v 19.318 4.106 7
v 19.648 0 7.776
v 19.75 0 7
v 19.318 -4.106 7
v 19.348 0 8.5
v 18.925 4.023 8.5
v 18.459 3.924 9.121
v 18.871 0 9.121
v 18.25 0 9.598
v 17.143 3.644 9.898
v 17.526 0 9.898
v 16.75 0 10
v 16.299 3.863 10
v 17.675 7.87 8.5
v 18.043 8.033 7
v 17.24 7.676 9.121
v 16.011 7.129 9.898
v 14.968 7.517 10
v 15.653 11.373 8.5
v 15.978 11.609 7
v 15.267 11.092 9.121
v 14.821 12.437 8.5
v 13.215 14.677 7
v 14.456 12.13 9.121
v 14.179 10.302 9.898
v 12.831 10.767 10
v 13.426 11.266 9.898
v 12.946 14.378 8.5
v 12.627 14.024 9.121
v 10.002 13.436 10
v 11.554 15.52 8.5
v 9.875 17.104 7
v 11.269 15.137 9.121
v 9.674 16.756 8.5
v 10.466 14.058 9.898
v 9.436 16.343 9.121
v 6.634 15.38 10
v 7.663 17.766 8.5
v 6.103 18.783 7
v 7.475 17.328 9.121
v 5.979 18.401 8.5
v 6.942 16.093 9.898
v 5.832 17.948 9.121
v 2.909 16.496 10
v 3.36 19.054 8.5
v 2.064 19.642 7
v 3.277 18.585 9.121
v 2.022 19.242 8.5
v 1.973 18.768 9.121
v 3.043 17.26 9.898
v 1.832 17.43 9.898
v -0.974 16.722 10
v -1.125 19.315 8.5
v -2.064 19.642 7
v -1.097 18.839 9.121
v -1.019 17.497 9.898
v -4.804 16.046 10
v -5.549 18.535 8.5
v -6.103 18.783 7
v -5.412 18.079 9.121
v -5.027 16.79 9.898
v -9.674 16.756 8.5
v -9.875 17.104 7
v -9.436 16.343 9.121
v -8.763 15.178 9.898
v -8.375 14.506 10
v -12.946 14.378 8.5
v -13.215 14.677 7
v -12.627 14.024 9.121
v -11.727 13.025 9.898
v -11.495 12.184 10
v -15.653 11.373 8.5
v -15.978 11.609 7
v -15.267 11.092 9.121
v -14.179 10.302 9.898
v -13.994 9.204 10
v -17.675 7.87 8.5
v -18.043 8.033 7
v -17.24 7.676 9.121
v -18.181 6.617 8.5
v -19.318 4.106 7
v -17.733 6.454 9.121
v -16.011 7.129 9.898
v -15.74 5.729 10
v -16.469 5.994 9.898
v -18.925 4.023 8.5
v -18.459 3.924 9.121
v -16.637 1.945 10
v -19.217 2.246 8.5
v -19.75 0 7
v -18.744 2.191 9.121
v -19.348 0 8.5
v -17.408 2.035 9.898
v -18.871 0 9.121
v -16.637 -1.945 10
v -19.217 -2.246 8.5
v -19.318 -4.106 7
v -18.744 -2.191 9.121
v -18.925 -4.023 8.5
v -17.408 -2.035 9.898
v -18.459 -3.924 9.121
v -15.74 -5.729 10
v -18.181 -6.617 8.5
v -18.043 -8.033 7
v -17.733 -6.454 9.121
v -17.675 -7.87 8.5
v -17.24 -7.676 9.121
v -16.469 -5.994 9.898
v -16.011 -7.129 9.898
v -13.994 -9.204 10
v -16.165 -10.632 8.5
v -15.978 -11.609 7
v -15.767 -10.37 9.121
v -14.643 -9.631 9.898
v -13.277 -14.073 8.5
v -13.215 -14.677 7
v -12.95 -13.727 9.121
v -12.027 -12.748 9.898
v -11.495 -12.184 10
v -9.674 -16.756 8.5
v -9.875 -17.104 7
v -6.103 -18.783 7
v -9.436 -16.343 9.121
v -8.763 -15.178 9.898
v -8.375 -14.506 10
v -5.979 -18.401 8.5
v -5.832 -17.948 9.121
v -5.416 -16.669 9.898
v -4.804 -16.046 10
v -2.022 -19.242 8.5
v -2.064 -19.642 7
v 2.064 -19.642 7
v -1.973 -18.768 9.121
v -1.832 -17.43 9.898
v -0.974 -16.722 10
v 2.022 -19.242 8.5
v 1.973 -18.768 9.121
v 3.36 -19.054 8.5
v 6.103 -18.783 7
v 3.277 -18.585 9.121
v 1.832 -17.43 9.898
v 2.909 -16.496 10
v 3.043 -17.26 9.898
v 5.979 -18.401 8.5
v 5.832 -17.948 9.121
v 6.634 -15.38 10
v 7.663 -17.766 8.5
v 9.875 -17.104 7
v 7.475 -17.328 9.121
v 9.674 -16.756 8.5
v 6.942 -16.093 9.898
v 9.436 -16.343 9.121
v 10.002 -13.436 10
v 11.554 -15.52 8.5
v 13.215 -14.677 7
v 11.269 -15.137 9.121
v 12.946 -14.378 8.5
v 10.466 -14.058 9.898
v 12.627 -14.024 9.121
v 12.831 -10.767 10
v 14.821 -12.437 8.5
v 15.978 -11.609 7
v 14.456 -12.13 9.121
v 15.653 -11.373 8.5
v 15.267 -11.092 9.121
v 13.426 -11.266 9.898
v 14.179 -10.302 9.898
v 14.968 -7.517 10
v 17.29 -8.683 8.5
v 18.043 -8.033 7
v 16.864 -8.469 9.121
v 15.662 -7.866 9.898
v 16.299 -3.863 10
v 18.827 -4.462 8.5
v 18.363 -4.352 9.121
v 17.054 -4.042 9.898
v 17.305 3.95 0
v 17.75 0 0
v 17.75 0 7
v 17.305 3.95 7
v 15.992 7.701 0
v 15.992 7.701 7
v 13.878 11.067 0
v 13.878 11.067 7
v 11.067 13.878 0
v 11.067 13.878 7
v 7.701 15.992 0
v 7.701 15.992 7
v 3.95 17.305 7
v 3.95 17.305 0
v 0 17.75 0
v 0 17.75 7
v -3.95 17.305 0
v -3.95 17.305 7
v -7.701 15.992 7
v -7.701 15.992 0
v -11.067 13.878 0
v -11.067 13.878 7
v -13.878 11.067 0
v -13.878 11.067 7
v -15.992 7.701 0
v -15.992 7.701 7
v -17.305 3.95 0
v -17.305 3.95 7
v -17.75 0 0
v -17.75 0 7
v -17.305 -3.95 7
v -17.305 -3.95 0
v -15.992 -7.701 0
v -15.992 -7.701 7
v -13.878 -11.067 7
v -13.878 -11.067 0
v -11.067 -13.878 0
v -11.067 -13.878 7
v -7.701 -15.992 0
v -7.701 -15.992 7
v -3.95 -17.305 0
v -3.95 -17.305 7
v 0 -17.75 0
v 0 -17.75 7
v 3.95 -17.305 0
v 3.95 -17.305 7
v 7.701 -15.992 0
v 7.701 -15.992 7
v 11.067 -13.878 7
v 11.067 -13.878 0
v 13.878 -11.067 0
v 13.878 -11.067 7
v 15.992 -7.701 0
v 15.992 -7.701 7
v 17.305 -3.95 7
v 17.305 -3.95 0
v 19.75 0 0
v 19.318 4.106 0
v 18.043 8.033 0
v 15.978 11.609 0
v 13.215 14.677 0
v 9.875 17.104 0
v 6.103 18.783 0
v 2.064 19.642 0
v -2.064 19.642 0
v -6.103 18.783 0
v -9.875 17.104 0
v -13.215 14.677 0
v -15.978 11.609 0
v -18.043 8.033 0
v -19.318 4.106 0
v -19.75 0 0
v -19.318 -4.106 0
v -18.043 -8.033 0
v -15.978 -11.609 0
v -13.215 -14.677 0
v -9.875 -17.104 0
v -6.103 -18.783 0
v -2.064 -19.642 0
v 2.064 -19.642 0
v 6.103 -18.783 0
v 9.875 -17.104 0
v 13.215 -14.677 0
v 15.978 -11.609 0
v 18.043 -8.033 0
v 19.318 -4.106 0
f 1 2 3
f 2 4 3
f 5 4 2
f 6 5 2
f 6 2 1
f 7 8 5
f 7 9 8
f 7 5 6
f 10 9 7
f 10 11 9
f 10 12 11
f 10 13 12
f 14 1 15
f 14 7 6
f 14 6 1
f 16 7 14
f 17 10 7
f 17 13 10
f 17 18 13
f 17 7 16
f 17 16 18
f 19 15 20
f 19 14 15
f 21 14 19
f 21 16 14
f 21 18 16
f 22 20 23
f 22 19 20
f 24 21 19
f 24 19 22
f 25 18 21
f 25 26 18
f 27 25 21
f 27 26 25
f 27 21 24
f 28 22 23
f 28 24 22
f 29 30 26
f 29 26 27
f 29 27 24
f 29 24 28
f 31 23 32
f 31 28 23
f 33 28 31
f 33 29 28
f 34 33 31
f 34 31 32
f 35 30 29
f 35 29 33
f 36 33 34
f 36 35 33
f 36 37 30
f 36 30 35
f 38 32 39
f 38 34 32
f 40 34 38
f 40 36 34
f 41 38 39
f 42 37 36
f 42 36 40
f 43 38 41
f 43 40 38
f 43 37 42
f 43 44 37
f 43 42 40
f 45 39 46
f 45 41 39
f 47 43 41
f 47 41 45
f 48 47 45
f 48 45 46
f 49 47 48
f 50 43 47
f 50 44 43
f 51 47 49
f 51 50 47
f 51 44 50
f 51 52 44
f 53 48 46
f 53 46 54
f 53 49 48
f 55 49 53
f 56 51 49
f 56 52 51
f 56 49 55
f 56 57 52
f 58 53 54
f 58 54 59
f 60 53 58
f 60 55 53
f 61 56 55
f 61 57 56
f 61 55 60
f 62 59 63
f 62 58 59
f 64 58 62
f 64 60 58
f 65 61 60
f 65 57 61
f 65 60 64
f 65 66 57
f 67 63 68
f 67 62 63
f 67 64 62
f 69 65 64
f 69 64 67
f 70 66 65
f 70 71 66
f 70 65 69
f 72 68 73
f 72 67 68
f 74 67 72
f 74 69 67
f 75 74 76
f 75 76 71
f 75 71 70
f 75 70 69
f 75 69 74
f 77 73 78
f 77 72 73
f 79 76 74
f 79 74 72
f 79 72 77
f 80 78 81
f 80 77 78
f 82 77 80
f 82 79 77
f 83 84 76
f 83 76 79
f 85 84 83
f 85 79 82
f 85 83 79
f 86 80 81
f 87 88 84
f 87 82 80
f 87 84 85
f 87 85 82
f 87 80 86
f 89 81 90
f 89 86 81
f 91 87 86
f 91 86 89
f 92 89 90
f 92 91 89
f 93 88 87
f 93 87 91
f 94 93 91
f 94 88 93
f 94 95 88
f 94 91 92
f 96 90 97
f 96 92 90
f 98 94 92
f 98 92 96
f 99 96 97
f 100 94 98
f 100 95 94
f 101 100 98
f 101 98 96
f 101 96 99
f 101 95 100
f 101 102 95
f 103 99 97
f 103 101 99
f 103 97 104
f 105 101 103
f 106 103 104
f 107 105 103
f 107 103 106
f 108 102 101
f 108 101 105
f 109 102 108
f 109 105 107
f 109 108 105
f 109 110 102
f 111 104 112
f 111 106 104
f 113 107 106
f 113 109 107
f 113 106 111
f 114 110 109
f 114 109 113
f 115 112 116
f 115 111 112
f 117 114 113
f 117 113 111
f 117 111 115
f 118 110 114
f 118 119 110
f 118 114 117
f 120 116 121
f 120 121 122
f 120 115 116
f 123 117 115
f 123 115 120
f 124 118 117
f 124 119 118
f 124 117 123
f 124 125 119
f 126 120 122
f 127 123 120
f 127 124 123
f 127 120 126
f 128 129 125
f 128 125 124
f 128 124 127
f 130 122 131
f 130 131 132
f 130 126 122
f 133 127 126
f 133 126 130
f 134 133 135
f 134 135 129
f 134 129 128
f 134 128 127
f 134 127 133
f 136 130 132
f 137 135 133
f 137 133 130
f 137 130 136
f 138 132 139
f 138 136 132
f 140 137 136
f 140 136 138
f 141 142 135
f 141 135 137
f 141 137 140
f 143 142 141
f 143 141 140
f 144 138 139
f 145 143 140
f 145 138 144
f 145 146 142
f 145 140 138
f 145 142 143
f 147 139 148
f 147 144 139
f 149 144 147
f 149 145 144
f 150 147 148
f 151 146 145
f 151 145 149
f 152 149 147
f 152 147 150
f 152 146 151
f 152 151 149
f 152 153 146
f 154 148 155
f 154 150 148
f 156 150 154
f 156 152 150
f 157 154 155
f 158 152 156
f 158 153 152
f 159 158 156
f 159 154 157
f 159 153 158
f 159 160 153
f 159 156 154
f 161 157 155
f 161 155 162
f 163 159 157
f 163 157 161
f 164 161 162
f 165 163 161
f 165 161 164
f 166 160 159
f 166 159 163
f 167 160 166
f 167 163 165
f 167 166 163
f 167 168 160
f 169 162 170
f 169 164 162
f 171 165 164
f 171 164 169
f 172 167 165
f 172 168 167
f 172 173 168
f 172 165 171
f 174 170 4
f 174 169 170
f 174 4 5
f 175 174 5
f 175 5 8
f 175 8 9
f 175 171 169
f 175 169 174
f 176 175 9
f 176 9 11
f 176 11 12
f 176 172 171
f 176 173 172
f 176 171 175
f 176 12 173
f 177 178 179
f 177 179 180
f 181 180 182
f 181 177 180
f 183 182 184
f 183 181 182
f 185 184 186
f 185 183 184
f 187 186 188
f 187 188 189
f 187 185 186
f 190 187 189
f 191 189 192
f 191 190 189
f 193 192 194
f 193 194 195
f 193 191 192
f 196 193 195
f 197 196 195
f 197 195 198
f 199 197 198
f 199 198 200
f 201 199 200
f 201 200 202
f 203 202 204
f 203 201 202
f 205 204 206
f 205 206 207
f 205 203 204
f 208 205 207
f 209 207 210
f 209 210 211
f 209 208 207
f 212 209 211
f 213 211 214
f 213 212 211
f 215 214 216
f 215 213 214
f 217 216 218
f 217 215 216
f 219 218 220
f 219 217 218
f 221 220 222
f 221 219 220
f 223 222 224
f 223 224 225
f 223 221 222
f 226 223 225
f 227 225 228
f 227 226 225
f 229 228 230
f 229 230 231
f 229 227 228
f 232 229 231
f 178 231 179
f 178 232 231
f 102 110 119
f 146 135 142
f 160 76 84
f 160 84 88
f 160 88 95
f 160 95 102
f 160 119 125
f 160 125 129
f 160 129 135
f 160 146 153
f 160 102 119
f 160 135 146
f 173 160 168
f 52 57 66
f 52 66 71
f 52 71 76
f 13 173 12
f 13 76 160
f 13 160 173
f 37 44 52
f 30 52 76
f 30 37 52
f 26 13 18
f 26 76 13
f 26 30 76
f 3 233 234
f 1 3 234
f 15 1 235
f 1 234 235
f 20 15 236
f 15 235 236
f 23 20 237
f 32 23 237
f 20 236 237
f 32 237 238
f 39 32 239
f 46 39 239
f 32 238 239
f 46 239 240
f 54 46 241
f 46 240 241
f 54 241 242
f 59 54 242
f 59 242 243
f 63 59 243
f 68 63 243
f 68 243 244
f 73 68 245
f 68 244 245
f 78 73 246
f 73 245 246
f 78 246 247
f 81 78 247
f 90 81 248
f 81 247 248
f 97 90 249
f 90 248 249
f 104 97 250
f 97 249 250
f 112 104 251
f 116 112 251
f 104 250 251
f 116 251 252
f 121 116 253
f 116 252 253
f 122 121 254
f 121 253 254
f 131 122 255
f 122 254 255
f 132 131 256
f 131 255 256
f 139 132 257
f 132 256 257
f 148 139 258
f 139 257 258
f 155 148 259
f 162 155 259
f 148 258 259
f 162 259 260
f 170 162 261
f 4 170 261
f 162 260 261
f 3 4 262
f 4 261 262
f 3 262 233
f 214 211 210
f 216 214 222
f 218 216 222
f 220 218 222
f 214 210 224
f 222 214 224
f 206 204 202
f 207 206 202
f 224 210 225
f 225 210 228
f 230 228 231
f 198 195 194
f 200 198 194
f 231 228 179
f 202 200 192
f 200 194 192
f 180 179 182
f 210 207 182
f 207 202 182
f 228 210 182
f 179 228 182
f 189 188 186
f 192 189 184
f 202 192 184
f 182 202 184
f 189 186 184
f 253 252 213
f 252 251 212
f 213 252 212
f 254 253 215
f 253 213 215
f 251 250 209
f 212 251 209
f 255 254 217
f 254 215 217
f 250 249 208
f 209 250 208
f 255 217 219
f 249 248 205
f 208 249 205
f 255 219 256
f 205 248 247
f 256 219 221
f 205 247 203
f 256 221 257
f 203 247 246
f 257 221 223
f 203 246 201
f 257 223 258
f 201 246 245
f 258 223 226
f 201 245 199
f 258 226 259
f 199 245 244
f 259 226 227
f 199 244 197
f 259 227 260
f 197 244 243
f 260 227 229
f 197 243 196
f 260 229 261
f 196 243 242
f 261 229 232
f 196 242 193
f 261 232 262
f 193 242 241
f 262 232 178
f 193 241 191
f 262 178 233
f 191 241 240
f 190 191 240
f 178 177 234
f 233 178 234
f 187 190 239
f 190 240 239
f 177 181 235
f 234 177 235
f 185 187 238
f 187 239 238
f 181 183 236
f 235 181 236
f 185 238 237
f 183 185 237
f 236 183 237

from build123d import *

# Parameters (mm, degrees)
F2_R     = 19.75
F2_R_2   = 17.75
F3_DEPTH = 10
F4_DEPTH = 7
F5_R     = 3


with BuildPart() as f3:
    # F2 (on Top) → F3 (new body)
    with BuildSketch(Plane.XY):
        Circle(F2_R)
        Circle(F2_R_2, mode=Mode.SUBTRACT)
        Circle(F2_R_2)
    extrude(amount=F3_DEPTH)

    # F2 (on Top) → F4 (cut)
    with BuildSketch(Plane.XY):
        Circle(F2_R_2)
    extrude(amount=F4_DEPTH, mode=Mode.SUBTRACT)

    # F5
    f5_edges = [f3.edges().sort_by_distance(p)[0] for p in [
        (-19.75, 0, 10),
    ]]
    fillet(f5_edges, radius=F5_R)


solid = f3.part
